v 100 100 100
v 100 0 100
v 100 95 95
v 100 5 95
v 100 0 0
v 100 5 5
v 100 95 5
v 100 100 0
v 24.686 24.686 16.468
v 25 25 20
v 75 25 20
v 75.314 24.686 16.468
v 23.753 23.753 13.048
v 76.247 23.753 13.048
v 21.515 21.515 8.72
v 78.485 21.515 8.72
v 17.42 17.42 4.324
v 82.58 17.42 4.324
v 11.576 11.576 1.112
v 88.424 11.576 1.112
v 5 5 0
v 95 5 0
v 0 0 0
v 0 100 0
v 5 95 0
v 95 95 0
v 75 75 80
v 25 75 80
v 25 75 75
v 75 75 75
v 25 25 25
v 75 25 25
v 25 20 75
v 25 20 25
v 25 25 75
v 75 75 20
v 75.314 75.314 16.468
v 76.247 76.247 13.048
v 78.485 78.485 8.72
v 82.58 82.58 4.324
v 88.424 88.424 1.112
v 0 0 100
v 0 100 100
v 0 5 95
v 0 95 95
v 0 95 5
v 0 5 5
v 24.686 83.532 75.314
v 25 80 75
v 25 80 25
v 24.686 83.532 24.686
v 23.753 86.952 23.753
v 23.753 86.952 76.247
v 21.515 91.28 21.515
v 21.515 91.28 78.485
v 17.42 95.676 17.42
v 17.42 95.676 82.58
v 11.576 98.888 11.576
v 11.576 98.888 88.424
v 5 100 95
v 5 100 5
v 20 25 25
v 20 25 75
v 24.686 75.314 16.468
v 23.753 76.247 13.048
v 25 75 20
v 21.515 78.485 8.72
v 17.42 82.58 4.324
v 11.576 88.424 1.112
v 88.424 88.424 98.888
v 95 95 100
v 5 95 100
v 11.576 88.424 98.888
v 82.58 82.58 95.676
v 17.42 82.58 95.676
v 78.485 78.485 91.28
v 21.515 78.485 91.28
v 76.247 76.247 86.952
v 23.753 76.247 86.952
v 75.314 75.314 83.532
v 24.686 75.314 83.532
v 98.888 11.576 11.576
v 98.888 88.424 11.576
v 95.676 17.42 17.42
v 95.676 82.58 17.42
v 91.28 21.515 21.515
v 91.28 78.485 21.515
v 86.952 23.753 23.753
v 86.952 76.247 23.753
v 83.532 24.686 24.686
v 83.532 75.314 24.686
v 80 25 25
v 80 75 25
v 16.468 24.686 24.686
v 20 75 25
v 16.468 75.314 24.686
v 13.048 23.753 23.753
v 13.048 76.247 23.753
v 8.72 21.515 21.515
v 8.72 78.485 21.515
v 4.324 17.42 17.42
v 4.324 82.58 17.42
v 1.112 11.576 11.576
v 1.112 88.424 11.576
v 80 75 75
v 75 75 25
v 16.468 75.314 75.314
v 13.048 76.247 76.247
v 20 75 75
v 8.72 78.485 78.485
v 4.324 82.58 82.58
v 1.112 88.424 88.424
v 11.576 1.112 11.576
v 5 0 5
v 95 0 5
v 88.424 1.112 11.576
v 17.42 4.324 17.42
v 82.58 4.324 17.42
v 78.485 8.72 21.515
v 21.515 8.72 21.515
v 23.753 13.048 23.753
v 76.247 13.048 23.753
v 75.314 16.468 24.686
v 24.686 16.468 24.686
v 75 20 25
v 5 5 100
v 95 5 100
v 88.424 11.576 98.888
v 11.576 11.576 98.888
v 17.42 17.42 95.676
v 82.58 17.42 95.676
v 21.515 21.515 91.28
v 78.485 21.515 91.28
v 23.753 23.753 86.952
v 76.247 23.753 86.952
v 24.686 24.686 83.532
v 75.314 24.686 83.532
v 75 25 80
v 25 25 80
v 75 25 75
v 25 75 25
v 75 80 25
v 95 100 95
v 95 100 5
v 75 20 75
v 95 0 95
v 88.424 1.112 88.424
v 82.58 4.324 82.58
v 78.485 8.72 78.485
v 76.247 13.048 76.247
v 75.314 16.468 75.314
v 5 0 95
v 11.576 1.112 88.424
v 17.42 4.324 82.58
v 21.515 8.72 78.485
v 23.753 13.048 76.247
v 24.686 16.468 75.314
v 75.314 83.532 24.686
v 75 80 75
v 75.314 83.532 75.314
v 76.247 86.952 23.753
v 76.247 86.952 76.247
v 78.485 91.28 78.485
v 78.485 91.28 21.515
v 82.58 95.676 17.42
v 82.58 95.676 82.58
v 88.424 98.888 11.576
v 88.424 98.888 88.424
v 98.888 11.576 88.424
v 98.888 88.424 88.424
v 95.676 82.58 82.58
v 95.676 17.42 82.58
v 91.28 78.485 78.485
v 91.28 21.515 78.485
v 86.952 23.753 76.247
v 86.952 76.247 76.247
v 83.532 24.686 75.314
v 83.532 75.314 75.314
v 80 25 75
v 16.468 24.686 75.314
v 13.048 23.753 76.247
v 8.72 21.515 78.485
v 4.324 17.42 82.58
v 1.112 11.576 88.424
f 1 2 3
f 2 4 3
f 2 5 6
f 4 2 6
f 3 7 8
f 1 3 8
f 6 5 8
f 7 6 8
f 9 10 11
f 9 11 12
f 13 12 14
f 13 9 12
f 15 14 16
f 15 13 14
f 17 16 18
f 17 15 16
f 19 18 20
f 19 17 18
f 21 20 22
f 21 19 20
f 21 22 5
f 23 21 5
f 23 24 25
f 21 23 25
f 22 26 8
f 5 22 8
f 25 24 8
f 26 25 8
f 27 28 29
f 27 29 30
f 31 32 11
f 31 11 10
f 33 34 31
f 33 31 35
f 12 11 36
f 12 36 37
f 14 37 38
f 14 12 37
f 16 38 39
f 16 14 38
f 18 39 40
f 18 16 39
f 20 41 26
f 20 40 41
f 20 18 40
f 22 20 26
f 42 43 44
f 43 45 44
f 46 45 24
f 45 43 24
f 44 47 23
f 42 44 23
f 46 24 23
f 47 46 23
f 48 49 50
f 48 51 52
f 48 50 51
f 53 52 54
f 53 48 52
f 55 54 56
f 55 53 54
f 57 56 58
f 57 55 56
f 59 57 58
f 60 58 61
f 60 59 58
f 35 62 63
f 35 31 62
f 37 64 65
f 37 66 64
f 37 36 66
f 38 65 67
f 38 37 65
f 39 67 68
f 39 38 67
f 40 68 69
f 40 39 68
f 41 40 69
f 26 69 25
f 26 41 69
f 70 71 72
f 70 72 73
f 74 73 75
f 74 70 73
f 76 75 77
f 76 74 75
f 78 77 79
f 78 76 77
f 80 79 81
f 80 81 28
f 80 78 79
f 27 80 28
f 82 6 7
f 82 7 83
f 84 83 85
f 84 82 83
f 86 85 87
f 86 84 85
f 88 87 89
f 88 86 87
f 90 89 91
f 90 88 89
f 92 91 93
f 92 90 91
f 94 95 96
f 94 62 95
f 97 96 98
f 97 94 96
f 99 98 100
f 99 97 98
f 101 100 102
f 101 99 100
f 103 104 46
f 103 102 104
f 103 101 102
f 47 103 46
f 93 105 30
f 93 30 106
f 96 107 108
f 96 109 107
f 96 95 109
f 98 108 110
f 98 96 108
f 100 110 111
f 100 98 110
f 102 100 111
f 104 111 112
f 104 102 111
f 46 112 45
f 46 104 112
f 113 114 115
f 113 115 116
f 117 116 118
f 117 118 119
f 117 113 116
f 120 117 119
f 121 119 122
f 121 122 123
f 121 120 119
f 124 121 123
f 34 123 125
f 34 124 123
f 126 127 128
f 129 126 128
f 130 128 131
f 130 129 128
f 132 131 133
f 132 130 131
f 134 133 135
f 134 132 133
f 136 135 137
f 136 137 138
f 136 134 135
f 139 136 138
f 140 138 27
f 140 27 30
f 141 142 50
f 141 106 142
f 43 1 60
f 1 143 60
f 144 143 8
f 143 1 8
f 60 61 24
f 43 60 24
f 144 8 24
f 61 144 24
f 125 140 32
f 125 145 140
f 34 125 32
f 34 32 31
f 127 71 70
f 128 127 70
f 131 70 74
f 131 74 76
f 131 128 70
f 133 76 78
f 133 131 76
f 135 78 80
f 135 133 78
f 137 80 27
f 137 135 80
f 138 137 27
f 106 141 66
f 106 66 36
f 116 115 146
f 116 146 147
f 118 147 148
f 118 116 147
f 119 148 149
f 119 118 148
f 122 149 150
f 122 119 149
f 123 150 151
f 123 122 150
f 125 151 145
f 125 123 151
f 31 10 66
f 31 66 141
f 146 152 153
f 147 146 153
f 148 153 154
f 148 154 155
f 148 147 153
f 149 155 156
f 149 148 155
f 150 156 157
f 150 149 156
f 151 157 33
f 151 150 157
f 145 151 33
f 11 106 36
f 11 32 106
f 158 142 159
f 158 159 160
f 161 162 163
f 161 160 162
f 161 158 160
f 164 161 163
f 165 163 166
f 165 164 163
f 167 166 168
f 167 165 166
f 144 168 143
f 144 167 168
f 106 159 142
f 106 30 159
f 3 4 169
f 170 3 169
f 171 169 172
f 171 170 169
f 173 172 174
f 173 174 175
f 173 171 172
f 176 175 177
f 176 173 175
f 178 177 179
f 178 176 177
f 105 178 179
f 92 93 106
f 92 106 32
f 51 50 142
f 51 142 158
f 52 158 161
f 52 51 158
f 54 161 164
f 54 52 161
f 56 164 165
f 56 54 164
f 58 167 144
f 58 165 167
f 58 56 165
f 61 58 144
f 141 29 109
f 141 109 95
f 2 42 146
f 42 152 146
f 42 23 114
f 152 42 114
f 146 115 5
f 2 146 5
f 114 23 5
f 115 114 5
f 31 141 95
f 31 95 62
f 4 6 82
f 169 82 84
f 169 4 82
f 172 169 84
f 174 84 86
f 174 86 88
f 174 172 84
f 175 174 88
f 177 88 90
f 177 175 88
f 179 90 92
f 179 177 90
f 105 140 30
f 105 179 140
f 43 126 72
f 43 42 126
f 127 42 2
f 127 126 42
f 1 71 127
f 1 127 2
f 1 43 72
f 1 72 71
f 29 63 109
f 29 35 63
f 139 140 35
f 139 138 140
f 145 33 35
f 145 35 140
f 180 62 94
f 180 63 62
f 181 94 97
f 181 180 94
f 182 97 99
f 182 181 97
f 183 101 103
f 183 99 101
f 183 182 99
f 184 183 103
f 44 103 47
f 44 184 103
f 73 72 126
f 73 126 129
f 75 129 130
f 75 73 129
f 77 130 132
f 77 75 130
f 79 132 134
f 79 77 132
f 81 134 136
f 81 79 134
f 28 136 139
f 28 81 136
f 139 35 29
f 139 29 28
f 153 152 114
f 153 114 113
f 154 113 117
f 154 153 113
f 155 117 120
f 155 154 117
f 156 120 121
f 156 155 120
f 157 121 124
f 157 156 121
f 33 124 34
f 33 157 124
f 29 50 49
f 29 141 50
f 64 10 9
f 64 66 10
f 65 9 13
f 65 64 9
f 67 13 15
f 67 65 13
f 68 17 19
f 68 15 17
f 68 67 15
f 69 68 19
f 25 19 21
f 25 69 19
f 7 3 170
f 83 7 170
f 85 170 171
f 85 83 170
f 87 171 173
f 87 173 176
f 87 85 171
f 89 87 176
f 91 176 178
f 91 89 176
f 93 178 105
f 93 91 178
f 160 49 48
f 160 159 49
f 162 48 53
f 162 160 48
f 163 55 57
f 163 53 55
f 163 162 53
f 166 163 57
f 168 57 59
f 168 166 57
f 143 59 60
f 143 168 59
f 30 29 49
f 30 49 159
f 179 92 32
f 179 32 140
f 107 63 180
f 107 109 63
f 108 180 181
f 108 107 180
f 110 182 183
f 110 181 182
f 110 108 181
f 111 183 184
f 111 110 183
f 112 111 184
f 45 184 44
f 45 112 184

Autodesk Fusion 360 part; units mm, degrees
sketch "Sketch1" plane through (0, 0, 0) normal (0, 0, 1) x (1, 0, 0)
  line L0 (0, 0) -> (100, 0)
  line L1 (100, 0) -> (100, 100)
  line L2 (100, 100) -> (0, 100)
  line L3 (0, 100) -> (0, 0)
extrude "Extrude1" add sketch "Sketch1" along normal blind 100
sketch "Sketch2" plane through (0, 0, 100) normal (0, 0, 1) x (-1, 0, 0)
  line L0 (0, -100) -> (0, 0)
  line L1 (0, 0) -> (-100, 0)
  line L2 (-100, 0) -> (-100, -100)
  line L3 (-100, -100) -> (0, -100)
  line L4 (-25, -75) -> (-75, -75)
  line L5 (-75, -75) -> (-75, -25)
  line L6 (-75, -25) -> (-25, -25)
  line L7 (-25, -25) -> (-25, -75)
extrude "Extrude2" cut sketch "Sketch2" against normal blind 100 contours L4 L5 L6 L7
sketch "Sketch3" plane through (0, 0, 0) normal (0, -1, 0) x (1, 0, 0)
  line L0 (0, 0) -> (100, 0)
  line L1 (100, 0) -> (100, 100)
  line L2 (100, 100) -> (0, 100)
  line L3 (0, 100) -> (0, 0)
  line L4 (25, 75) -> (75, 75)
  line L5 (75, 75) -> (75, 25)
  line L6 (75, 25) -> (25, 25)
  line L7 (25, 25) -> (25, 75)
extrude "Extrude3" cut sketch "Sketch3" against normal blind 100 contours L4 L5 L6 L7
sketch "Sketch4" plane through (100, 0, 0) normal (1, 0, 0) x (0, 1, 0)
  line L0 (0, 0) -> (100, 0)
  line L1 (100, 0) -> (100, 100)
  line L2 (100, 100) -> (0, 100)
  line L3 (0, 100) -> (0, 0)
  line L4 (25, 75) -> (75, 75)
  line L5 (75, 75) -> (75, 25)
  line L6 (75, 25) -> (25, 25)
  line L7 (25, 25) -> (25, 75)
extrude "Extrude4" cut sketch "Sketch4" against normal blind 100 contours L4 L5 L6 L7
fillet "Fillet1" radius 20 12 edges at (75, 50, 100) (50, 25, 100) (50, 75, 100) (25, 50, 100) (50, 100, 25) (75, 100, 50) (50, 100, 75) (25, 100, 50) (0, 50, 25) (0, 25, 50) (0, 50, 75) (0, 75, 50)
fillet "Fillet2" radius 20 12 edges at (50, 0, 75) (25, 0, 50) (50, 0, 25) (75, 0, 50) (100, 50, 75) (100, 25, 50) (100, 75, 50) (100, 50, 25) (75, 50, 0) (50, 25, 0) (25, 50, 0) (50, 75, 0)
